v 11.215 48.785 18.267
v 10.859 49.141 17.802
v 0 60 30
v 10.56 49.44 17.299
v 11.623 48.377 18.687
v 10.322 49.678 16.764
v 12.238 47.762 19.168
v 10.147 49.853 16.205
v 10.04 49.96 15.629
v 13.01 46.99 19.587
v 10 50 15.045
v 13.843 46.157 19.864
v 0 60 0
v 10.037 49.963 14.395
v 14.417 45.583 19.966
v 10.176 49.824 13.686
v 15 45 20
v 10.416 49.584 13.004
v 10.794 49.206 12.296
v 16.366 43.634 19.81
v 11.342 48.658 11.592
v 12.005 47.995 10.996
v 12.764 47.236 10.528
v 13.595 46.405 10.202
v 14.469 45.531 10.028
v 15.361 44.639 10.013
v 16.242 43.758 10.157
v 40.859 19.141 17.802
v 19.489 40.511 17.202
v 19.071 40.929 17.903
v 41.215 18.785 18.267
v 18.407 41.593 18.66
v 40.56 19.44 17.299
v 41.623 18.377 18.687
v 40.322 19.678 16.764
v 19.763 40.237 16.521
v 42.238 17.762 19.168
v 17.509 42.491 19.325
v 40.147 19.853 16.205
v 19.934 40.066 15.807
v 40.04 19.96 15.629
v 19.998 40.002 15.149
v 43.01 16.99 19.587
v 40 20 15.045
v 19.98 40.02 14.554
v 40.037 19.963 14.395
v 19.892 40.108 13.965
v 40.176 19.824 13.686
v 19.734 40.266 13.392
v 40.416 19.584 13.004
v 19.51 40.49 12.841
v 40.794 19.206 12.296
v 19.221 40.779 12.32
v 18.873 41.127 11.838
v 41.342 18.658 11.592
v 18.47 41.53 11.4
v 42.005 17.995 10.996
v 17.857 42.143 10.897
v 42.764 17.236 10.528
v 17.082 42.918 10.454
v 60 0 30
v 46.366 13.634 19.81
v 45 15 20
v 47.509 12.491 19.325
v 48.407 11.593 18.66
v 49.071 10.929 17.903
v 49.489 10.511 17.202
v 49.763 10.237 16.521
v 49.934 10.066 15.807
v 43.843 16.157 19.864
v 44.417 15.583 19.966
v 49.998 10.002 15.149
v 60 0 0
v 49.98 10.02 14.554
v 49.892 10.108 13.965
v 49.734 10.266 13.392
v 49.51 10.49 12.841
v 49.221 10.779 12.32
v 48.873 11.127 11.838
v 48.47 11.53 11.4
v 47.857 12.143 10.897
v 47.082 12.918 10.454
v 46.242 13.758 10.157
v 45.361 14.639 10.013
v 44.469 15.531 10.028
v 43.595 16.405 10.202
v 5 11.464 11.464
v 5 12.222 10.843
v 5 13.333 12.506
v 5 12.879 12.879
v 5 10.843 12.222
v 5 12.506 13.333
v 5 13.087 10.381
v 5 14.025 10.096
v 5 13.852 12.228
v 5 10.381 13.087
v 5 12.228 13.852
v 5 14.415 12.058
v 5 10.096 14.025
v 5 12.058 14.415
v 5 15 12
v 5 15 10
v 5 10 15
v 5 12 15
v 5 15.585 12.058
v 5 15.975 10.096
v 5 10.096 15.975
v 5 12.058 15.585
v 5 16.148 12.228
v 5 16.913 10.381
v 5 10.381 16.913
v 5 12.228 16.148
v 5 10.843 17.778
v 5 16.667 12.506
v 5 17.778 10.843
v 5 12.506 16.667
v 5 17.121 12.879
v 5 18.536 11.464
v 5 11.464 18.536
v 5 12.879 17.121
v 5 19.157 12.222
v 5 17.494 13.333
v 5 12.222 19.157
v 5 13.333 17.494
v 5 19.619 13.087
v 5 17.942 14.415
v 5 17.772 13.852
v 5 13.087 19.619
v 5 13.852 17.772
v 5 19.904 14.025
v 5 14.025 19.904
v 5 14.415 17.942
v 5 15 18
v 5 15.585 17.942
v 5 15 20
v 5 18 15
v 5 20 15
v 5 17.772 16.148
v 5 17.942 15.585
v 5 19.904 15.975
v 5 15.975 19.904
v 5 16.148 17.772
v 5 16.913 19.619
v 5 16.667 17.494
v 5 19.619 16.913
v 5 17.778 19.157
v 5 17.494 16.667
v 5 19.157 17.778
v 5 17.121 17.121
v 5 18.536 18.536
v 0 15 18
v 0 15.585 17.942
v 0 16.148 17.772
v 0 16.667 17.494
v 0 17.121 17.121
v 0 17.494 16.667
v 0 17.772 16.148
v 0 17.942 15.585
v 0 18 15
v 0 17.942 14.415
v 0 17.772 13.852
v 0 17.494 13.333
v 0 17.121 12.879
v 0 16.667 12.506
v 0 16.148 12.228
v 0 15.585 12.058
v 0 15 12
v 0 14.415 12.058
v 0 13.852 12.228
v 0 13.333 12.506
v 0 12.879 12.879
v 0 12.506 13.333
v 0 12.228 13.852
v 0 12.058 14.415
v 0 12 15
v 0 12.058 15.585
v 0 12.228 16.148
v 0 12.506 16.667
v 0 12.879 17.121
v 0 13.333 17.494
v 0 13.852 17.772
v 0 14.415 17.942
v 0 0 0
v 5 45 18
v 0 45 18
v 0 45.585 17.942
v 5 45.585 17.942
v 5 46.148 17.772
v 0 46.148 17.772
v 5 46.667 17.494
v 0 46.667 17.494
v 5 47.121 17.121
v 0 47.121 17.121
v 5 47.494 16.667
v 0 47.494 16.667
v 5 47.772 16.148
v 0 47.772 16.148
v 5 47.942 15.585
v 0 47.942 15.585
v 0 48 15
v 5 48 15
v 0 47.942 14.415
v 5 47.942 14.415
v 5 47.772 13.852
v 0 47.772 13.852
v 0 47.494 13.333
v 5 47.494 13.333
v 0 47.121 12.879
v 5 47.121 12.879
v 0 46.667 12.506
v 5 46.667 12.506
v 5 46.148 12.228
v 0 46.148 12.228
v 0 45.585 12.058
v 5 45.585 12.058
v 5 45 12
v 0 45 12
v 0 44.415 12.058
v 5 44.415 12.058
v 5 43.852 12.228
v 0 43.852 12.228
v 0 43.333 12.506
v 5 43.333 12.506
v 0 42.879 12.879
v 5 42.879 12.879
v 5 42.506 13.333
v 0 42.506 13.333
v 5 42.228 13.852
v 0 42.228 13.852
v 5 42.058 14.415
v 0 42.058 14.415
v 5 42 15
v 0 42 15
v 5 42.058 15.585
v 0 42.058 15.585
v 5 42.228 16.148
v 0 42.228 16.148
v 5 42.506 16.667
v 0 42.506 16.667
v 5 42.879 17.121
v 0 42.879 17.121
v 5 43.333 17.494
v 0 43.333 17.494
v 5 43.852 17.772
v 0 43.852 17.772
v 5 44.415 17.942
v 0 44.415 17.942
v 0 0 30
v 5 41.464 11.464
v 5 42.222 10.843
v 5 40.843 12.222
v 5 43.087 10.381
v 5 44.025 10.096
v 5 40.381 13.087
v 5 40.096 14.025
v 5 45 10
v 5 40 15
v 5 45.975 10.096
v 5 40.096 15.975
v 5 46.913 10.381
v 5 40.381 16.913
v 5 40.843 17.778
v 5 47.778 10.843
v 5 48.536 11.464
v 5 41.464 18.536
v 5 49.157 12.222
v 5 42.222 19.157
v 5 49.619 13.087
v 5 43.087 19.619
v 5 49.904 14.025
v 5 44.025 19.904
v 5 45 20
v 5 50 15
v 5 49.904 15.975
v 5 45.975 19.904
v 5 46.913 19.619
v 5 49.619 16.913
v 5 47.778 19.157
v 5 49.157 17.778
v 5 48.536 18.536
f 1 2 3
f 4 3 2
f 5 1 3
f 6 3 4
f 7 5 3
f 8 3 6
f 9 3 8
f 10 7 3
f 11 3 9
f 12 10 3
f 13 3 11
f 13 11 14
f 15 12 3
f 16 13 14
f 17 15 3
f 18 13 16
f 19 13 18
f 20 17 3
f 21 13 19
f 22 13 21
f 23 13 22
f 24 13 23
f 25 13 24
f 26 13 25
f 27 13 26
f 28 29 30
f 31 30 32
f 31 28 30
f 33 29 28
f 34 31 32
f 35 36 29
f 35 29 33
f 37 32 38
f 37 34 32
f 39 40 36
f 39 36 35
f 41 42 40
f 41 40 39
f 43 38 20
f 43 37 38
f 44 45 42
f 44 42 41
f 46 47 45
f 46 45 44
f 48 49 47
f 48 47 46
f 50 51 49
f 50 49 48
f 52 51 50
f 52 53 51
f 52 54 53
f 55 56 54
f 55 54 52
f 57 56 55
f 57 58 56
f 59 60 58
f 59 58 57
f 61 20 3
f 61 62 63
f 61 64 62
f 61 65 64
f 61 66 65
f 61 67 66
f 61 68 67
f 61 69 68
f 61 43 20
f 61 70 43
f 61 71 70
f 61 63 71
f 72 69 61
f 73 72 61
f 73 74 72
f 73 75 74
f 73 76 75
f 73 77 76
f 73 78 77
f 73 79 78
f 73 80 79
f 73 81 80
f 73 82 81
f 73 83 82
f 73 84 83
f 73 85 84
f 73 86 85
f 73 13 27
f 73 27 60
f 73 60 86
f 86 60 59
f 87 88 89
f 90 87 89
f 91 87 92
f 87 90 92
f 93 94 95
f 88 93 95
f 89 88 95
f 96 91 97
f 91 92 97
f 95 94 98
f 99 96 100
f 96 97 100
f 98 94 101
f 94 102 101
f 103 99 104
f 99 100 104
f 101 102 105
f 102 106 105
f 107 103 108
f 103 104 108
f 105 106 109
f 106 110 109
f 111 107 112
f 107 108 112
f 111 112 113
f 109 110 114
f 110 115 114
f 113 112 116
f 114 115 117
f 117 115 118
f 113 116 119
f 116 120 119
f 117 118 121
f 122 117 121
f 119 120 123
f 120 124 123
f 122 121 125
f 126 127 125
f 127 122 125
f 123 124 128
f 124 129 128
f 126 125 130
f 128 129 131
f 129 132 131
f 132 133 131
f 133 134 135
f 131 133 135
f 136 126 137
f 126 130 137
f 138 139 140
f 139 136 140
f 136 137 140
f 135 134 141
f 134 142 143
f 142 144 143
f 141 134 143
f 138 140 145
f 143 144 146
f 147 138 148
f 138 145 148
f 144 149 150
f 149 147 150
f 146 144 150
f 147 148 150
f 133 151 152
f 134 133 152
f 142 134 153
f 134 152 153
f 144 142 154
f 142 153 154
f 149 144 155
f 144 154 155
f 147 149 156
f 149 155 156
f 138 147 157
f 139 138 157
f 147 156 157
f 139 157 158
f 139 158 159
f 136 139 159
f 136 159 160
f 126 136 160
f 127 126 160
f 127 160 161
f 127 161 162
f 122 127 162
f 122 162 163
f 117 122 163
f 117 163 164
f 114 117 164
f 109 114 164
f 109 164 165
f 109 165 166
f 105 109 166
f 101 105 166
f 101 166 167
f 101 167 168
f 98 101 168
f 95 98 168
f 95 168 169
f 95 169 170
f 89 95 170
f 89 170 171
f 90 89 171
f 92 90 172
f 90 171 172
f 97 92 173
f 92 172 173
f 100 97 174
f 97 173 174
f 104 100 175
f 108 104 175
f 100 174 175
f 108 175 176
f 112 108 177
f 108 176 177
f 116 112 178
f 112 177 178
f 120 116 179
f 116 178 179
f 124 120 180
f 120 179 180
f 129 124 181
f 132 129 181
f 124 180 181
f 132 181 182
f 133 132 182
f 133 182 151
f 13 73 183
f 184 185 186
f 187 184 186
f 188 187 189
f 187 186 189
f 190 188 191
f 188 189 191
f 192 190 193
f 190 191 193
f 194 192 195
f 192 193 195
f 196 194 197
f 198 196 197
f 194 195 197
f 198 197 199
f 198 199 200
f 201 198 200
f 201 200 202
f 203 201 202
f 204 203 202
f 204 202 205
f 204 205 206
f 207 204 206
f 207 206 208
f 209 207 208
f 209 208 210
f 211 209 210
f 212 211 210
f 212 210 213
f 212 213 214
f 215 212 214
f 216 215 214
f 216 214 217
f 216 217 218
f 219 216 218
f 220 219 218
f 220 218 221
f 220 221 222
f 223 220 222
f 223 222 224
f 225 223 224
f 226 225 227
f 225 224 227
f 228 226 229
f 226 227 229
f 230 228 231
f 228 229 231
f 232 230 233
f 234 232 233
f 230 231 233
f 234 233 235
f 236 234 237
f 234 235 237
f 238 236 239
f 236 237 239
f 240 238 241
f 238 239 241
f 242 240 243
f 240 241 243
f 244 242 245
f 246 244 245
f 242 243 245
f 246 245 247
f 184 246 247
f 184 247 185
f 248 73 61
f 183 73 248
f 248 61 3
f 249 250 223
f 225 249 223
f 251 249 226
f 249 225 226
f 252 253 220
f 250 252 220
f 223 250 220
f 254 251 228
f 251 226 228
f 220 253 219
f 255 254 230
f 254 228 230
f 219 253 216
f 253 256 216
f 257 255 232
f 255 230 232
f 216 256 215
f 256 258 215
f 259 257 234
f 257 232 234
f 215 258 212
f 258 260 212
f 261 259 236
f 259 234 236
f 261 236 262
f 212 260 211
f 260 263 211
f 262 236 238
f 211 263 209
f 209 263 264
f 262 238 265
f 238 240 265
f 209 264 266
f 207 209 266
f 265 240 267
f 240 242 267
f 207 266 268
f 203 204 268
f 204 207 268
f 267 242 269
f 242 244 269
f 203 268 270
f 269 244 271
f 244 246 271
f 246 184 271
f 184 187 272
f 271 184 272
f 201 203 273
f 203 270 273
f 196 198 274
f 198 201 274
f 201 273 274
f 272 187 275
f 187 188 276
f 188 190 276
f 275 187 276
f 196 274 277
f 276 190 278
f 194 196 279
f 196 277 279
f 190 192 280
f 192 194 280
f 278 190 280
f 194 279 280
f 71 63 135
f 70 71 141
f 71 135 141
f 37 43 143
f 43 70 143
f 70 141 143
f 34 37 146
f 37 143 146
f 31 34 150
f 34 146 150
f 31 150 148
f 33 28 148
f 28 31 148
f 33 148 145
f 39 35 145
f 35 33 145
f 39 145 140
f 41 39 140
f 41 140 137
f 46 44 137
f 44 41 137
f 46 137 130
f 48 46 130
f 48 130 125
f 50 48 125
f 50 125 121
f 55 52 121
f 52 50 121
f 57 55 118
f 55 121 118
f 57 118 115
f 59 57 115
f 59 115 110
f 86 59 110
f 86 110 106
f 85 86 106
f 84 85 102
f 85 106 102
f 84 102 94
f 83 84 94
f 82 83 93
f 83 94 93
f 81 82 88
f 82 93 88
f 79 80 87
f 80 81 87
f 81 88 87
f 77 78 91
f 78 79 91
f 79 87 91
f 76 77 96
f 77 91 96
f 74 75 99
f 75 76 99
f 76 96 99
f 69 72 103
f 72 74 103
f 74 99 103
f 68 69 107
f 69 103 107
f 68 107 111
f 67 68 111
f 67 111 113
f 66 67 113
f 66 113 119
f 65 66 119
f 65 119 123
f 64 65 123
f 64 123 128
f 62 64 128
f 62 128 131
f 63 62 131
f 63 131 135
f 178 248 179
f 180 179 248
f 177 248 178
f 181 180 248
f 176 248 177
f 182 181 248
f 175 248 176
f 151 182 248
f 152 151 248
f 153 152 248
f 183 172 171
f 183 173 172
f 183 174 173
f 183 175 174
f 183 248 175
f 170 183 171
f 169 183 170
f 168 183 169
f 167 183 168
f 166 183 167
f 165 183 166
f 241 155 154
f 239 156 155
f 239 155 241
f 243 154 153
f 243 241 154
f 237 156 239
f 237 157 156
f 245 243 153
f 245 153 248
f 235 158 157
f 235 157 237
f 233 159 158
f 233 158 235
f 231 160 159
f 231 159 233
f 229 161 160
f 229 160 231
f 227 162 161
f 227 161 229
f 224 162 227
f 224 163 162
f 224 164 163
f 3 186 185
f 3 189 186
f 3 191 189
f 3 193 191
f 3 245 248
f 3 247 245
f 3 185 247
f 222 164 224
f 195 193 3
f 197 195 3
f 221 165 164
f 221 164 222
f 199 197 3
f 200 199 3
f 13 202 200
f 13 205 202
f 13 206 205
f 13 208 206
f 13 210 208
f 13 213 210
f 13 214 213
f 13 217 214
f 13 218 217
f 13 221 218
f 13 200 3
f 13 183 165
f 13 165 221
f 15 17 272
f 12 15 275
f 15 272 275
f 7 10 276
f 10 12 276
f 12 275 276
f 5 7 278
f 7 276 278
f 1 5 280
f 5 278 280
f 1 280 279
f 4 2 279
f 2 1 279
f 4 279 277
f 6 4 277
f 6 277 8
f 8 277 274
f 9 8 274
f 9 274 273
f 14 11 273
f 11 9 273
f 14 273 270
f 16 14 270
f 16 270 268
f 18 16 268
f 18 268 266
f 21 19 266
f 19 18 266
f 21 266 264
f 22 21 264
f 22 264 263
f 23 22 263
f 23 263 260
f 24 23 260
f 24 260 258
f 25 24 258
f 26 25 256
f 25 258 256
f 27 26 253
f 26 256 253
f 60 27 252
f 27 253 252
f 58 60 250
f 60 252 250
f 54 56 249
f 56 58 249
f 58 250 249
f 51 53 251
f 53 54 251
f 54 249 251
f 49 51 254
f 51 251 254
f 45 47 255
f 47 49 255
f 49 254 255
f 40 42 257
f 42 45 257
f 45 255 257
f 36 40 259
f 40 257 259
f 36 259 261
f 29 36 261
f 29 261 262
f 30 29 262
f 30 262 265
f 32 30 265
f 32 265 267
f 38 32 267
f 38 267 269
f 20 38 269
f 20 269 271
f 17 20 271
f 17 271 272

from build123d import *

# Parameters (mm, degrees)
EXTRUDE_1_DEPTH     = 30
SKETCH_2_R          = 3
CUT_EXTRUDE_1_DEPTH = 60
SKETCH_3_R          = 5
CUT_EXTRUDE_2_DEPTH = 60


with BuildPart() as part:
    # 스케치1 → 보스-돌출1 (new body)
    with BuildSketch(Plane.XY):
        Polygon((0, 0), (0, 60), (60, 0), align=None)
    extrude(amount=EXTRUDE_1_DEPTH)

    # 스케치2 → 컷-돌출1 (cut)
    with BuildSketch(Plane.ZY):
        with Locations((15, 15)):
            Circle(SKETCH_2_R)
        with Locations((15, 45)):
            Circle(SKETCH_2_R)
    extrude(amount=-CUT_EXTRUDE_1_DEPTH, mode=Mode.SUBTRACT)

    # 스케치3 → 컷-돌출2 (cut)
    with BuildSketch(Plane.ZY.offset(-5)):
        with Locations((15, 15)):
            Circle(SKETCH_3_R)
        with Locations((15, 45)):
            Circle(SKETCH_3_R)
    extrude(amount=-CUT_EXTRUDE_2_DEPTH, mode=Mode.SUBTRACT)


solid = part.part
